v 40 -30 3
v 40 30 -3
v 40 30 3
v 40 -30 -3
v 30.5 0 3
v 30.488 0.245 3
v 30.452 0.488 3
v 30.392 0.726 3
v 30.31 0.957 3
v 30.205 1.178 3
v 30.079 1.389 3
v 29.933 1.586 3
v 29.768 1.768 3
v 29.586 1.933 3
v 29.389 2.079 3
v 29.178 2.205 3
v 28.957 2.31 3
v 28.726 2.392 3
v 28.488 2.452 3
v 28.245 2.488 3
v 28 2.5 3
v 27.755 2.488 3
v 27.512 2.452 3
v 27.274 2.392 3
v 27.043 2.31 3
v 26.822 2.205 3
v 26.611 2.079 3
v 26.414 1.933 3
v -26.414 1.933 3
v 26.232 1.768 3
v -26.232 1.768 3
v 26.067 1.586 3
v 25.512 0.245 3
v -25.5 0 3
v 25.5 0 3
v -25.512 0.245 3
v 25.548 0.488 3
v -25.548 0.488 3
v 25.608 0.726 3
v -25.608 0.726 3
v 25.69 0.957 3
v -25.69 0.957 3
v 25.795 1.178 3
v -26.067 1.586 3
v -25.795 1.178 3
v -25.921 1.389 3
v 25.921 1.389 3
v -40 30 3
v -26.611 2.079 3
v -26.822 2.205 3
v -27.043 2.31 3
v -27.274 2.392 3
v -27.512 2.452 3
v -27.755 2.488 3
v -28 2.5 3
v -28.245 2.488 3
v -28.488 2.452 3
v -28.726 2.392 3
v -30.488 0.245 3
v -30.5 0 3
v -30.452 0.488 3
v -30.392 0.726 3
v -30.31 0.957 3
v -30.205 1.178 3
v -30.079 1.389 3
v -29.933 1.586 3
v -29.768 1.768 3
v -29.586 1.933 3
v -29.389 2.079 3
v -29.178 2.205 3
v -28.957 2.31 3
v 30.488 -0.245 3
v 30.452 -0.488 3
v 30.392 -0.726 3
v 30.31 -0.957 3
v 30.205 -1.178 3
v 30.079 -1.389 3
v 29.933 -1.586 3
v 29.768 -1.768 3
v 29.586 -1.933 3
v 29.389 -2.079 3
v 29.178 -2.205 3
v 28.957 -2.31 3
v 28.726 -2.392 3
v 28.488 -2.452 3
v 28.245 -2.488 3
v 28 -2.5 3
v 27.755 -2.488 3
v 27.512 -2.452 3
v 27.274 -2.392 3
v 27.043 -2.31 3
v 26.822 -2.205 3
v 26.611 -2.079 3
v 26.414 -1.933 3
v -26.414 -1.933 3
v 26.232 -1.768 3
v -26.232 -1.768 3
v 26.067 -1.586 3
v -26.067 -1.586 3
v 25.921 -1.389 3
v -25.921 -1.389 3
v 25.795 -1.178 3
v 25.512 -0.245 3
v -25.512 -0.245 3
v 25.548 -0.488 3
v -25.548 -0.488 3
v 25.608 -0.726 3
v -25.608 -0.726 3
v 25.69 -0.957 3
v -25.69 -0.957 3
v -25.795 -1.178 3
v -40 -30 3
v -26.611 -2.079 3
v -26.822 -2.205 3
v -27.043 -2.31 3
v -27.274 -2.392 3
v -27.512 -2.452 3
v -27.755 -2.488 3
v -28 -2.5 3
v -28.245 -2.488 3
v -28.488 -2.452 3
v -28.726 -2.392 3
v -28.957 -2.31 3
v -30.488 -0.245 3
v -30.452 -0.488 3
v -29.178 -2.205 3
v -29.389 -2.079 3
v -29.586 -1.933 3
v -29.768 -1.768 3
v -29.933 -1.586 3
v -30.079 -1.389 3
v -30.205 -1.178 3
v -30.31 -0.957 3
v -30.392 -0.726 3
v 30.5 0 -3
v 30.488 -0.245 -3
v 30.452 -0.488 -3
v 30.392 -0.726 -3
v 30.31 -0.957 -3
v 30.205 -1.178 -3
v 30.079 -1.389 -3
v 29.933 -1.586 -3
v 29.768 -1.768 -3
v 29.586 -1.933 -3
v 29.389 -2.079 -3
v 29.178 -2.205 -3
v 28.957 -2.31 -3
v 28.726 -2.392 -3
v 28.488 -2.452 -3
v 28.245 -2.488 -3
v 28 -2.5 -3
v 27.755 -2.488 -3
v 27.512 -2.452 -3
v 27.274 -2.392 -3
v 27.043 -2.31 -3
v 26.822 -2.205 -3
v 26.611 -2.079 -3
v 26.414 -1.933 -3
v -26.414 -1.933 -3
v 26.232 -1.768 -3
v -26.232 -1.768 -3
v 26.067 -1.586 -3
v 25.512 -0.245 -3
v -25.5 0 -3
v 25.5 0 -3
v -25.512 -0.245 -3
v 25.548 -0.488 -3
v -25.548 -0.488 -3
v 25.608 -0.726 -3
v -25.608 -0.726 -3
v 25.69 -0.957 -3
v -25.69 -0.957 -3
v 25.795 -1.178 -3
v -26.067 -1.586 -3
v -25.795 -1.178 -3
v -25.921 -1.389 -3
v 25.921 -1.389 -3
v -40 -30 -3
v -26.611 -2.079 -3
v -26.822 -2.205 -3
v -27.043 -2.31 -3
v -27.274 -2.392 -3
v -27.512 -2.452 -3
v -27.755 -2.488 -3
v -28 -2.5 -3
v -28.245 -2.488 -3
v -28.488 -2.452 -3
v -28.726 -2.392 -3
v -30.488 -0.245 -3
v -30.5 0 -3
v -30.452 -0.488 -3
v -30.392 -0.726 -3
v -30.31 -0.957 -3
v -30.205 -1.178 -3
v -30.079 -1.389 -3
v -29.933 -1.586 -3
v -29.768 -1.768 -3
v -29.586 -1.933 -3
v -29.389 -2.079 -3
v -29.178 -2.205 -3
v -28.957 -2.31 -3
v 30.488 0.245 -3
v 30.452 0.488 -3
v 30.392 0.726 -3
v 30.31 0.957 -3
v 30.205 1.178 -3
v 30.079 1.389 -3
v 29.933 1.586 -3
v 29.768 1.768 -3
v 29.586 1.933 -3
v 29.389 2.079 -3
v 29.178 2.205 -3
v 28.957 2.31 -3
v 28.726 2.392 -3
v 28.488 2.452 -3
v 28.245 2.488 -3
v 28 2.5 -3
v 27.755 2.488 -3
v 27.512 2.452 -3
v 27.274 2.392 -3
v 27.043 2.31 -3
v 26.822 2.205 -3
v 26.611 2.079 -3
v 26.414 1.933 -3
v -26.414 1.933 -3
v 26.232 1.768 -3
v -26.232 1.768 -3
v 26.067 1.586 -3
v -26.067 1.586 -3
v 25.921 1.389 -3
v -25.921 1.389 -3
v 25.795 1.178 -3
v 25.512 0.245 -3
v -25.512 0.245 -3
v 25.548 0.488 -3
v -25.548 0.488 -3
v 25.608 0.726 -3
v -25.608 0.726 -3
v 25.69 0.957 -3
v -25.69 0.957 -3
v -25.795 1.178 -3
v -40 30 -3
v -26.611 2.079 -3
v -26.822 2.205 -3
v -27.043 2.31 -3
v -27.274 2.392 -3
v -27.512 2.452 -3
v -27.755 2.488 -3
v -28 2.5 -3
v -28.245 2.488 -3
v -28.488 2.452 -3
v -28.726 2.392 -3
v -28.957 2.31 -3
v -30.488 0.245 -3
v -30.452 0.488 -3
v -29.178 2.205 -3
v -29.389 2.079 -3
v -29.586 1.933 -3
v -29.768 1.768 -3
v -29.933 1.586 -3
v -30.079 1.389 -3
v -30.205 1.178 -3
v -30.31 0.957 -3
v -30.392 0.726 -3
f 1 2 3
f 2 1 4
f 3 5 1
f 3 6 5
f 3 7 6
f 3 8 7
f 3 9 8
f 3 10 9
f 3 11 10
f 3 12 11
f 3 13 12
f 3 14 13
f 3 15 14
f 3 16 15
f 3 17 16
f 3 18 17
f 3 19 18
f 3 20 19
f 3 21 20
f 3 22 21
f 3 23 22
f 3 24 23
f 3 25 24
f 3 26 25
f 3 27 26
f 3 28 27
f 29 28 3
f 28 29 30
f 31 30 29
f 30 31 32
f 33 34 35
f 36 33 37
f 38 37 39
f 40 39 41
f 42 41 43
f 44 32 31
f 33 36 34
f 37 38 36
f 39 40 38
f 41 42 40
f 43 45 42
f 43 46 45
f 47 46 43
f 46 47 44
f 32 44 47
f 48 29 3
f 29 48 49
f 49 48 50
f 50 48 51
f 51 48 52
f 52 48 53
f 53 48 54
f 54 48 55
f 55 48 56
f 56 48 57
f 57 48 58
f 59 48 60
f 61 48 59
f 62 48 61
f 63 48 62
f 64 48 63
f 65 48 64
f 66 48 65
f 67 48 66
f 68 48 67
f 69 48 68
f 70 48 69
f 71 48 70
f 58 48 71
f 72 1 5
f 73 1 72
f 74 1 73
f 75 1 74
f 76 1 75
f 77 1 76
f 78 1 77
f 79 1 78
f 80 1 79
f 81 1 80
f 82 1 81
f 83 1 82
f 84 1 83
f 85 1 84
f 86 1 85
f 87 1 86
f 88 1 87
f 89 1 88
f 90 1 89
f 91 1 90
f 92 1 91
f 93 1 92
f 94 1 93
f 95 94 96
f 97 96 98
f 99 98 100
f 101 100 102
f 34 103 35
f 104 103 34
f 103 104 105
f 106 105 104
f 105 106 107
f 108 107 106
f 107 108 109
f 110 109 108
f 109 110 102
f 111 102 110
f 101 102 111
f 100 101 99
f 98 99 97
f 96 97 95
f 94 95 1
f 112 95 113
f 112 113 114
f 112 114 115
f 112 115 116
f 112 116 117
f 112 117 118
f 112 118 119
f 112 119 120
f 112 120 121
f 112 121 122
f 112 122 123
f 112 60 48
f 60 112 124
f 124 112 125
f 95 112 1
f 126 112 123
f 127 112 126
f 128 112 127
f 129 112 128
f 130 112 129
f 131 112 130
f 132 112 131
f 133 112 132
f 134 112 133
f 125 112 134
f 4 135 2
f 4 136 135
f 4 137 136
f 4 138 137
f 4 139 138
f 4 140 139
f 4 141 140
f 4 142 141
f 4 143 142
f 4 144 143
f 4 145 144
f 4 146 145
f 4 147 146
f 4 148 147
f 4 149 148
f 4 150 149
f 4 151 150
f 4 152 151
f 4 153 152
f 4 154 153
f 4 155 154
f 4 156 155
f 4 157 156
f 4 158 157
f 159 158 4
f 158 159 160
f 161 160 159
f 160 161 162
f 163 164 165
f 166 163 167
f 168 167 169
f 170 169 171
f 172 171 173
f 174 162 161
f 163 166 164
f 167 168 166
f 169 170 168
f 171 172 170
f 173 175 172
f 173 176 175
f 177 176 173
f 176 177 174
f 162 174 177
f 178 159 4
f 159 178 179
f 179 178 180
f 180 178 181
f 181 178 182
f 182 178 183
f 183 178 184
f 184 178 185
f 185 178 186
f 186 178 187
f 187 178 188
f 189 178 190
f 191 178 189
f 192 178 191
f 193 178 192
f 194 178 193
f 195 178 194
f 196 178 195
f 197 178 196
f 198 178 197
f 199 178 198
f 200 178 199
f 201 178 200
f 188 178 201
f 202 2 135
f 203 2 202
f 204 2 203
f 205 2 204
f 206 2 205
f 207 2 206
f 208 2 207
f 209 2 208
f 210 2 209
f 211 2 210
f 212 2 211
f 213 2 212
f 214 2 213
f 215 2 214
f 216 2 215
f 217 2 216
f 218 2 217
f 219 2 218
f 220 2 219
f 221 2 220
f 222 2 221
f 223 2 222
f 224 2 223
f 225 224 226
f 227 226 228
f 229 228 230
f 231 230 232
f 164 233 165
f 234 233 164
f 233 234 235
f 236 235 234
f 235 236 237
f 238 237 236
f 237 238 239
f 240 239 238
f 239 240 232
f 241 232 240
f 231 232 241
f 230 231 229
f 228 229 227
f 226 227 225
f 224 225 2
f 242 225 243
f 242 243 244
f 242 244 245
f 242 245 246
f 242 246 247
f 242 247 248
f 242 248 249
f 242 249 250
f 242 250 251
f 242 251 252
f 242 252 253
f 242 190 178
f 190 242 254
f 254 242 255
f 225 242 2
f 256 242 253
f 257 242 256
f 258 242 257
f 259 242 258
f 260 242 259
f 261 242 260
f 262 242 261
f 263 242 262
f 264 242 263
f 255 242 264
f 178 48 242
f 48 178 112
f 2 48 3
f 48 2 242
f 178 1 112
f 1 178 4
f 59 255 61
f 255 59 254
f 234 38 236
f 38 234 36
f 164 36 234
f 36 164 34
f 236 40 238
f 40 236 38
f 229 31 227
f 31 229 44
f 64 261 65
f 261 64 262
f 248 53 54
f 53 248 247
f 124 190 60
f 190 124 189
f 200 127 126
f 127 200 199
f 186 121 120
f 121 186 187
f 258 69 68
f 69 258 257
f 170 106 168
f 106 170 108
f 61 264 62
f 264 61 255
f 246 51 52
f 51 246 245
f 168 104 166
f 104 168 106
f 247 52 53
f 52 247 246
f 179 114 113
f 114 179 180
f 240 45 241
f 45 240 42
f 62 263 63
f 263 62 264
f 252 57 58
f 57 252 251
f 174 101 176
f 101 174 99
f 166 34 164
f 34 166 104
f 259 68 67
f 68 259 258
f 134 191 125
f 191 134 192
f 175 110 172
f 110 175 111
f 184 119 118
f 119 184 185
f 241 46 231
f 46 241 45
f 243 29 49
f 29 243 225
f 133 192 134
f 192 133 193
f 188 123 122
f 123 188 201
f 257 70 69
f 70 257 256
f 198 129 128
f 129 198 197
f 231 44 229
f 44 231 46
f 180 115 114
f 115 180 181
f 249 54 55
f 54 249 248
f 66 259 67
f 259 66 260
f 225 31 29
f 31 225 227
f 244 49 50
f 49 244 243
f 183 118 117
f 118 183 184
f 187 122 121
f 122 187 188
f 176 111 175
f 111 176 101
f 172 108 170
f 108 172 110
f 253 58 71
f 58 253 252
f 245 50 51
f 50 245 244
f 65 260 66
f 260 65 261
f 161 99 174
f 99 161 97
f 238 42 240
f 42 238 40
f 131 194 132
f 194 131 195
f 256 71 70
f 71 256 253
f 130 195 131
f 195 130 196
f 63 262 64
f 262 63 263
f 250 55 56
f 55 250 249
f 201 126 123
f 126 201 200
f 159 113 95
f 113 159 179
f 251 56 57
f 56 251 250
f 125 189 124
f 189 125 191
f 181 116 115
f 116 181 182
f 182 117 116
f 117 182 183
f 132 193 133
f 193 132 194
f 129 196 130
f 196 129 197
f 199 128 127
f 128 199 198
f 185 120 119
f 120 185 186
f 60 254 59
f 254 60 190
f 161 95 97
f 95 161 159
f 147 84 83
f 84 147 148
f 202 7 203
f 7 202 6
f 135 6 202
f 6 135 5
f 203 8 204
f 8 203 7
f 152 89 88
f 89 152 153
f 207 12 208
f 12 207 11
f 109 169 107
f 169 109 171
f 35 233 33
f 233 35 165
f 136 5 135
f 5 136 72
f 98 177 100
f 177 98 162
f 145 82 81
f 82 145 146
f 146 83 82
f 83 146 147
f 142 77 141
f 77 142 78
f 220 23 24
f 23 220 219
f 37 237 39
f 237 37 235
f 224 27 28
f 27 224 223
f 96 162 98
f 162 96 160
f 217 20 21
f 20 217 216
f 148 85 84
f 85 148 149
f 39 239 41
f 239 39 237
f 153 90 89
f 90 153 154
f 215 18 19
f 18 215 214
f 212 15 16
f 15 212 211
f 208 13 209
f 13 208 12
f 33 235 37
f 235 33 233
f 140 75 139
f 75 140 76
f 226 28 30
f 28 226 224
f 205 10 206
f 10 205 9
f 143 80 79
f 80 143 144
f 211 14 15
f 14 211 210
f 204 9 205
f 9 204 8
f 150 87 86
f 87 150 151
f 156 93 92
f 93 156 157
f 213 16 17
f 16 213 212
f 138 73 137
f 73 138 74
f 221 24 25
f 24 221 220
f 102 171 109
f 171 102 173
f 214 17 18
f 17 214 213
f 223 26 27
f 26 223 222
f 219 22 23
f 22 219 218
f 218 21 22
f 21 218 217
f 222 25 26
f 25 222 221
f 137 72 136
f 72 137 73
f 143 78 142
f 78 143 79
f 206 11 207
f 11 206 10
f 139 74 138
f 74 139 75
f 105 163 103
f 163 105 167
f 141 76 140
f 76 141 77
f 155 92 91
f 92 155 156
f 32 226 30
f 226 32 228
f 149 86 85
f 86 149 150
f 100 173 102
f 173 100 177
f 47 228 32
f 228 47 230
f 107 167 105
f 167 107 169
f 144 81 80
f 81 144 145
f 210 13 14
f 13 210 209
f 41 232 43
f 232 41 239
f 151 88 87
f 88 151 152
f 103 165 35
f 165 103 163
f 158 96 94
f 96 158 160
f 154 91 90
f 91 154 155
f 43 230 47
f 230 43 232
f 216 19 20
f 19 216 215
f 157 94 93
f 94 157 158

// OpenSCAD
// ФОРМА 3D → OpenSCAD, режим script: параметрическая запись
// правьте числа и модули; непереведённые команды заменены polyhedron
$fn = 64;
// плита0 = box size=[80,60,6] center=да
module plita0() {
  translate([0, 0, 0]) cube([80, 60, 6], center = true);
}

// h1 = cylinder radius=2.5 height=20 at=[-28,0,-6]
module h1() {
  translate([-28, 0, 4]) cylinder(h = 20, r = 2.5, center = true);
}

// h2 = cylinder radius=2.5 height=20 at=[28,0,-6]
module h2() {
  translate([28, 0, 4]) cylinder(h = 20, r = 2.5, center = true);
}

// плита = difference
module plita() {
  difference() {
    plita0();
    h1();
    h2();
  }
}

plita();   // плита
